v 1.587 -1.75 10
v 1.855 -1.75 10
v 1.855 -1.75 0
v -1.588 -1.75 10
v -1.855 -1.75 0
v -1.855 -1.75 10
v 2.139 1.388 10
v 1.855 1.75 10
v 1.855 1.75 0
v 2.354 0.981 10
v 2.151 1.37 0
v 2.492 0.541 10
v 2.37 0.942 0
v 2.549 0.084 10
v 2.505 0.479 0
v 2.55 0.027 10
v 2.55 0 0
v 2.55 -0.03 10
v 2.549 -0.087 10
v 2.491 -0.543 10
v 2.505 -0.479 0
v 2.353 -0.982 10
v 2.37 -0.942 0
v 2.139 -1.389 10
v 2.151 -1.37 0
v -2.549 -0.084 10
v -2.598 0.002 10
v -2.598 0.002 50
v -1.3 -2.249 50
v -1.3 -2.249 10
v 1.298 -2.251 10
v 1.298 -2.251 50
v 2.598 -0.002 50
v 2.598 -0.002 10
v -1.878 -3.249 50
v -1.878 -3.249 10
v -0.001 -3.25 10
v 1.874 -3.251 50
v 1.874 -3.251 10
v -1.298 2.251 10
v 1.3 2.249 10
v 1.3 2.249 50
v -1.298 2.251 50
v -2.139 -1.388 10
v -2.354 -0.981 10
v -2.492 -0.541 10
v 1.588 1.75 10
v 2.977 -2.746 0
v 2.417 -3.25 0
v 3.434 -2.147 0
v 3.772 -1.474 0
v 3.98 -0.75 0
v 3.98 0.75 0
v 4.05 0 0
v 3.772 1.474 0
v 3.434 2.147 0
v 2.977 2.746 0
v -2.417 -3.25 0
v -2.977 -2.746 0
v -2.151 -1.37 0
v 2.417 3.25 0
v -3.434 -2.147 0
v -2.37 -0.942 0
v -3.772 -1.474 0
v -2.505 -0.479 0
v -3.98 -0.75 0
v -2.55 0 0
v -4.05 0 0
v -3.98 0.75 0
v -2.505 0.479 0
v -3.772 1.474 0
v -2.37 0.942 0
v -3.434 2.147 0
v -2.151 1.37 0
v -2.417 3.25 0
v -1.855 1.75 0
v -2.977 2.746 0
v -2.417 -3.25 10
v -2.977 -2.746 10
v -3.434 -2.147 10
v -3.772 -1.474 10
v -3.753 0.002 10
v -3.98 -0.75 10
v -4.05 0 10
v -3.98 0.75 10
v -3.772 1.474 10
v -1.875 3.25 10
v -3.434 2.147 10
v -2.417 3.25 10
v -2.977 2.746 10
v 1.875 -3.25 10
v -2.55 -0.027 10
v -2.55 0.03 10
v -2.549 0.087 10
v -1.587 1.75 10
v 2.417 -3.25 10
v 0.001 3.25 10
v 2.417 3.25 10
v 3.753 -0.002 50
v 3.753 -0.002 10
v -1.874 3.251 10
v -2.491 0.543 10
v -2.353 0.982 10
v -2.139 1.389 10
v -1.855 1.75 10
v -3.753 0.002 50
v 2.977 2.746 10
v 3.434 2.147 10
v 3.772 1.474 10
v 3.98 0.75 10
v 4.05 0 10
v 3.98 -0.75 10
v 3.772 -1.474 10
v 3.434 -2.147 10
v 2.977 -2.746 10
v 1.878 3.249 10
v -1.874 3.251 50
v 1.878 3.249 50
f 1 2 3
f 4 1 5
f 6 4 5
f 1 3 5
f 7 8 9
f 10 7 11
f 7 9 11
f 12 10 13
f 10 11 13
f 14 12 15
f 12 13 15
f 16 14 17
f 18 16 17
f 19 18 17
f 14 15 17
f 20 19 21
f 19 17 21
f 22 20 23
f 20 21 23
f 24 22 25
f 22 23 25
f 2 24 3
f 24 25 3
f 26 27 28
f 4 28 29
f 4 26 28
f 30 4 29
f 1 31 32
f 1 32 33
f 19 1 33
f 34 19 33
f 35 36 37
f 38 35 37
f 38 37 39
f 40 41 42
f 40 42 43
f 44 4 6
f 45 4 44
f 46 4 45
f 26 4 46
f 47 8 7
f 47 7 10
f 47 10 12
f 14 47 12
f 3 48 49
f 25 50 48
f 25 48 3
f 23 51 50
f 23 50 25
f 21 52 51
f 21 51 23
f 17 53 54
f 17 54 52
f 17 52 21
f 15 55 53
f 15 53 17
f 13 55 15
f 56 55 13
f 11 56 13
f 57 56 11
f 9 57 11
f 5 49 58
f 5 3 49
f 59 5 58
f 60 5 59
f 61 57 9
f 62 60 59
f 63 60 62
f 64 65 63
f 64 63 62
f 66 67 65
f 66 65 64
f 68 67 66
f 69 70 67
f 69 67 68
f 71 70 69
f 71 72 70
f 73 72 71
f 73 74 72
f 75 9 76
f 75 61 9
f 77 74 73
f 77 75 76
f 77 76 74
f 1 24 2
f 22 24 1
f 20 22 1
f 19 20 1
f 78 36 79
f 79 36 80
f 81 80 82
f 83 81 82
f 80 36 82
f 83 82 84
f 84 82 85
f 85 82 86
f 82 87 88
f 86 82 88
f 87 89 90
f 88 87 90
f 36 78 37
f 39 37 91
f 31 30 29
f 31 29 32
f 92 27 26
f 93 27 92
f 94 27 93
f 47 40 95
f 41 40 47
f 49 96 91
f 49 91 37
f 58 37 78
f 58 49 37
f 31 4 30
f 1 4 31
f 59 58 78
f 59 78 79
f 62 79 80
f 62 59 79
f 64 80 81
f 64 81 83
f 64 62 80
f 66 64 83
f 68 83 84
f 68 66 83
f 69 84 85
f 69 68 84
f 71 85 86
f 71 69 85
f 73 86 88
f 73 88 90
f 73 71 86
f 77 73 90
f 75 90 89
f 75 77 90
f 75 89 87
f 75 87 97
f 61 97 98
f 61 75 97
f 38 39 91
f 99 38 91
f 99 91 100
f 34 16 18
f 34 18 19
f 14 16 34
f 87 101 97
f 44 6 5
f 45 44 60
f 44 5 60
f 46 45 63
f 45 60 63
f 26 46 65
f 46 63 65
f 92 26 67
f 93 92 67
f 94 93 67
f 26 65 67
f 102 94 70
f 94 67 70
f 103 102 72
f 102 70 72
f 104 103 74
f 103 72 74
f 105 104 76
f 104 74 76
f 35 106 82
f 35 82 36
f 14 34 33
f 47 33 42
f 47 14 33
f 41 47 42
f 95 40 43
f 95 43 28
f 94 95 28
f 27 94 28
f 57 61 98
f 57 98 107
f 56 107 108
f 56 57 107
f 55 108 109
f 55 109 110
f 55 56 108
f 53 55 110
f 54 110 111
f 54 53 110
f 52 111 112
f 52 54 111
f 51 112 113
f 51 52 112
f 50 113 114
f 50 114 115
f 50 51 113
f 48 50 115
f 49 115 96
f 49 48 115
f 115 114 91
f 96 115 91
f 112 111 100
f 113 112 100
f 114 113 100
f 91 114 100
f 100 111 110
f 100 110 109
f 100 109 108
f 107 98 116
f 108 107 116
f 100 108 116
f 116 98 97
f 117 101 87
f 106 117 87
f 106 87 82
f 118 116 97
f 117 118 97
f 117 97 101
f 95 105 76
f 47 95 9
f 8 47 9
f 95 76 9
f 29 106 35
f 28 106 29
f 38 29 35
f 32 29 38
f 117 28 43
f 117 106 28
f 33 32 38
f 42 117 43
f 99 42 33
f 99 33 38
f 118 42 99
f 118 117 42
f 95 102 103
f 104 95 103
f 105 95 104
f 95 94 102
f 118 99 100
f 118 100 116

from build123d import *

# Parameters (mm, degrees)
BOSS_EXTRUDE2_DEPTH     = 10
BOSS_EXTRUDE3_DEPTH     = 40
CUT_EXTRUDE3_DEPTH      = 51.268999561
CUT_EXTRUDE3_DEPTH_BACK = 40
CUT_EXTRUDE4_DEPTH      = 10


with BuildPart() as part:
    # Sketch1 → Boss-Extrude2 (new body)
    with BuildSketch(Plane.XY):
        with BuildLine():
            Line((-2.416609195, 3.25), (2.416609195, 3.25))
            ThreePointArc((2.416609195, 3.25), (4.05, 0), (2.416609195, -3.25))
            Line((2.416609195, -3.25), (-2.416609195, -3.25))
            ThreePointArc((-2.416609195, -3.25), (-4.05, 0), (-2.416609195, 3.25))
        make_face()
    extrude(amount=BOSS_EXTRUDE2_DEPTH)

    # Sketch4 → Boss-Extrude3 (add)
    with BuildSketch(Plane.XY.offset(10)):
        Polygon((1.87443765, -3.251125471), (3.752776074, -0.002252112), (1.878338424, 3.248873359), (-1.87443765, 3.251125471), (-3.752776074, 0.002252112), (-1.878338424, -3.248873359), align=None)
    extrude(amount=BOSS_EXTRUDE3_DEPTH)

    # Sketch5 → Cut-Extrude3 (cut, two sides: drawn at the far end of the back side and taken through both)
    with BuildSketch(Plane.XY.offset(50).offset(-CUT_EXTRUDE3_DEPTH_BACK)):
        Polygon((-1.300388139, -2.249220017), (1.297687604, -2.250779172), (2.598075744, -0.001559155), (1.300388139, 2.249220017), (-1.297687604, 2.250779172), (-2.598075744, 0.001559155), align=None)
    extrude(amount=CUT_EXTRUDE3_DEPTH + CUT_EXTRUDE3_DEPTH_BACK, mode=Mode.SUBTRACT)

    # Sketch3 → Cut-Extrude4 (cut)
    with BuildSketch(Plane(origin=(0, 0, 0), x_dir=(-1, 0, 0), z_dir=(0, 0, -1))):
        with BuildLine():
            Line((1.854723699, 1.75), (-1.854723699, 1.75))
            ThreePointArc((-1.854723699, 1.75), (-2.55, 0), (-1.854723699, -1.75))
            Line((-1.854723699, -1.75), (1.854723699, -1.75))
            ThreePointArc((1.854723699, -1.75), (2.55, 0), (1.854723699, 1.75))
        make_face()
    extrude(amount=-CUT_EXTRUDE4_DEPTH, mode=Mode.SUBTRACT)


solid = part.part
